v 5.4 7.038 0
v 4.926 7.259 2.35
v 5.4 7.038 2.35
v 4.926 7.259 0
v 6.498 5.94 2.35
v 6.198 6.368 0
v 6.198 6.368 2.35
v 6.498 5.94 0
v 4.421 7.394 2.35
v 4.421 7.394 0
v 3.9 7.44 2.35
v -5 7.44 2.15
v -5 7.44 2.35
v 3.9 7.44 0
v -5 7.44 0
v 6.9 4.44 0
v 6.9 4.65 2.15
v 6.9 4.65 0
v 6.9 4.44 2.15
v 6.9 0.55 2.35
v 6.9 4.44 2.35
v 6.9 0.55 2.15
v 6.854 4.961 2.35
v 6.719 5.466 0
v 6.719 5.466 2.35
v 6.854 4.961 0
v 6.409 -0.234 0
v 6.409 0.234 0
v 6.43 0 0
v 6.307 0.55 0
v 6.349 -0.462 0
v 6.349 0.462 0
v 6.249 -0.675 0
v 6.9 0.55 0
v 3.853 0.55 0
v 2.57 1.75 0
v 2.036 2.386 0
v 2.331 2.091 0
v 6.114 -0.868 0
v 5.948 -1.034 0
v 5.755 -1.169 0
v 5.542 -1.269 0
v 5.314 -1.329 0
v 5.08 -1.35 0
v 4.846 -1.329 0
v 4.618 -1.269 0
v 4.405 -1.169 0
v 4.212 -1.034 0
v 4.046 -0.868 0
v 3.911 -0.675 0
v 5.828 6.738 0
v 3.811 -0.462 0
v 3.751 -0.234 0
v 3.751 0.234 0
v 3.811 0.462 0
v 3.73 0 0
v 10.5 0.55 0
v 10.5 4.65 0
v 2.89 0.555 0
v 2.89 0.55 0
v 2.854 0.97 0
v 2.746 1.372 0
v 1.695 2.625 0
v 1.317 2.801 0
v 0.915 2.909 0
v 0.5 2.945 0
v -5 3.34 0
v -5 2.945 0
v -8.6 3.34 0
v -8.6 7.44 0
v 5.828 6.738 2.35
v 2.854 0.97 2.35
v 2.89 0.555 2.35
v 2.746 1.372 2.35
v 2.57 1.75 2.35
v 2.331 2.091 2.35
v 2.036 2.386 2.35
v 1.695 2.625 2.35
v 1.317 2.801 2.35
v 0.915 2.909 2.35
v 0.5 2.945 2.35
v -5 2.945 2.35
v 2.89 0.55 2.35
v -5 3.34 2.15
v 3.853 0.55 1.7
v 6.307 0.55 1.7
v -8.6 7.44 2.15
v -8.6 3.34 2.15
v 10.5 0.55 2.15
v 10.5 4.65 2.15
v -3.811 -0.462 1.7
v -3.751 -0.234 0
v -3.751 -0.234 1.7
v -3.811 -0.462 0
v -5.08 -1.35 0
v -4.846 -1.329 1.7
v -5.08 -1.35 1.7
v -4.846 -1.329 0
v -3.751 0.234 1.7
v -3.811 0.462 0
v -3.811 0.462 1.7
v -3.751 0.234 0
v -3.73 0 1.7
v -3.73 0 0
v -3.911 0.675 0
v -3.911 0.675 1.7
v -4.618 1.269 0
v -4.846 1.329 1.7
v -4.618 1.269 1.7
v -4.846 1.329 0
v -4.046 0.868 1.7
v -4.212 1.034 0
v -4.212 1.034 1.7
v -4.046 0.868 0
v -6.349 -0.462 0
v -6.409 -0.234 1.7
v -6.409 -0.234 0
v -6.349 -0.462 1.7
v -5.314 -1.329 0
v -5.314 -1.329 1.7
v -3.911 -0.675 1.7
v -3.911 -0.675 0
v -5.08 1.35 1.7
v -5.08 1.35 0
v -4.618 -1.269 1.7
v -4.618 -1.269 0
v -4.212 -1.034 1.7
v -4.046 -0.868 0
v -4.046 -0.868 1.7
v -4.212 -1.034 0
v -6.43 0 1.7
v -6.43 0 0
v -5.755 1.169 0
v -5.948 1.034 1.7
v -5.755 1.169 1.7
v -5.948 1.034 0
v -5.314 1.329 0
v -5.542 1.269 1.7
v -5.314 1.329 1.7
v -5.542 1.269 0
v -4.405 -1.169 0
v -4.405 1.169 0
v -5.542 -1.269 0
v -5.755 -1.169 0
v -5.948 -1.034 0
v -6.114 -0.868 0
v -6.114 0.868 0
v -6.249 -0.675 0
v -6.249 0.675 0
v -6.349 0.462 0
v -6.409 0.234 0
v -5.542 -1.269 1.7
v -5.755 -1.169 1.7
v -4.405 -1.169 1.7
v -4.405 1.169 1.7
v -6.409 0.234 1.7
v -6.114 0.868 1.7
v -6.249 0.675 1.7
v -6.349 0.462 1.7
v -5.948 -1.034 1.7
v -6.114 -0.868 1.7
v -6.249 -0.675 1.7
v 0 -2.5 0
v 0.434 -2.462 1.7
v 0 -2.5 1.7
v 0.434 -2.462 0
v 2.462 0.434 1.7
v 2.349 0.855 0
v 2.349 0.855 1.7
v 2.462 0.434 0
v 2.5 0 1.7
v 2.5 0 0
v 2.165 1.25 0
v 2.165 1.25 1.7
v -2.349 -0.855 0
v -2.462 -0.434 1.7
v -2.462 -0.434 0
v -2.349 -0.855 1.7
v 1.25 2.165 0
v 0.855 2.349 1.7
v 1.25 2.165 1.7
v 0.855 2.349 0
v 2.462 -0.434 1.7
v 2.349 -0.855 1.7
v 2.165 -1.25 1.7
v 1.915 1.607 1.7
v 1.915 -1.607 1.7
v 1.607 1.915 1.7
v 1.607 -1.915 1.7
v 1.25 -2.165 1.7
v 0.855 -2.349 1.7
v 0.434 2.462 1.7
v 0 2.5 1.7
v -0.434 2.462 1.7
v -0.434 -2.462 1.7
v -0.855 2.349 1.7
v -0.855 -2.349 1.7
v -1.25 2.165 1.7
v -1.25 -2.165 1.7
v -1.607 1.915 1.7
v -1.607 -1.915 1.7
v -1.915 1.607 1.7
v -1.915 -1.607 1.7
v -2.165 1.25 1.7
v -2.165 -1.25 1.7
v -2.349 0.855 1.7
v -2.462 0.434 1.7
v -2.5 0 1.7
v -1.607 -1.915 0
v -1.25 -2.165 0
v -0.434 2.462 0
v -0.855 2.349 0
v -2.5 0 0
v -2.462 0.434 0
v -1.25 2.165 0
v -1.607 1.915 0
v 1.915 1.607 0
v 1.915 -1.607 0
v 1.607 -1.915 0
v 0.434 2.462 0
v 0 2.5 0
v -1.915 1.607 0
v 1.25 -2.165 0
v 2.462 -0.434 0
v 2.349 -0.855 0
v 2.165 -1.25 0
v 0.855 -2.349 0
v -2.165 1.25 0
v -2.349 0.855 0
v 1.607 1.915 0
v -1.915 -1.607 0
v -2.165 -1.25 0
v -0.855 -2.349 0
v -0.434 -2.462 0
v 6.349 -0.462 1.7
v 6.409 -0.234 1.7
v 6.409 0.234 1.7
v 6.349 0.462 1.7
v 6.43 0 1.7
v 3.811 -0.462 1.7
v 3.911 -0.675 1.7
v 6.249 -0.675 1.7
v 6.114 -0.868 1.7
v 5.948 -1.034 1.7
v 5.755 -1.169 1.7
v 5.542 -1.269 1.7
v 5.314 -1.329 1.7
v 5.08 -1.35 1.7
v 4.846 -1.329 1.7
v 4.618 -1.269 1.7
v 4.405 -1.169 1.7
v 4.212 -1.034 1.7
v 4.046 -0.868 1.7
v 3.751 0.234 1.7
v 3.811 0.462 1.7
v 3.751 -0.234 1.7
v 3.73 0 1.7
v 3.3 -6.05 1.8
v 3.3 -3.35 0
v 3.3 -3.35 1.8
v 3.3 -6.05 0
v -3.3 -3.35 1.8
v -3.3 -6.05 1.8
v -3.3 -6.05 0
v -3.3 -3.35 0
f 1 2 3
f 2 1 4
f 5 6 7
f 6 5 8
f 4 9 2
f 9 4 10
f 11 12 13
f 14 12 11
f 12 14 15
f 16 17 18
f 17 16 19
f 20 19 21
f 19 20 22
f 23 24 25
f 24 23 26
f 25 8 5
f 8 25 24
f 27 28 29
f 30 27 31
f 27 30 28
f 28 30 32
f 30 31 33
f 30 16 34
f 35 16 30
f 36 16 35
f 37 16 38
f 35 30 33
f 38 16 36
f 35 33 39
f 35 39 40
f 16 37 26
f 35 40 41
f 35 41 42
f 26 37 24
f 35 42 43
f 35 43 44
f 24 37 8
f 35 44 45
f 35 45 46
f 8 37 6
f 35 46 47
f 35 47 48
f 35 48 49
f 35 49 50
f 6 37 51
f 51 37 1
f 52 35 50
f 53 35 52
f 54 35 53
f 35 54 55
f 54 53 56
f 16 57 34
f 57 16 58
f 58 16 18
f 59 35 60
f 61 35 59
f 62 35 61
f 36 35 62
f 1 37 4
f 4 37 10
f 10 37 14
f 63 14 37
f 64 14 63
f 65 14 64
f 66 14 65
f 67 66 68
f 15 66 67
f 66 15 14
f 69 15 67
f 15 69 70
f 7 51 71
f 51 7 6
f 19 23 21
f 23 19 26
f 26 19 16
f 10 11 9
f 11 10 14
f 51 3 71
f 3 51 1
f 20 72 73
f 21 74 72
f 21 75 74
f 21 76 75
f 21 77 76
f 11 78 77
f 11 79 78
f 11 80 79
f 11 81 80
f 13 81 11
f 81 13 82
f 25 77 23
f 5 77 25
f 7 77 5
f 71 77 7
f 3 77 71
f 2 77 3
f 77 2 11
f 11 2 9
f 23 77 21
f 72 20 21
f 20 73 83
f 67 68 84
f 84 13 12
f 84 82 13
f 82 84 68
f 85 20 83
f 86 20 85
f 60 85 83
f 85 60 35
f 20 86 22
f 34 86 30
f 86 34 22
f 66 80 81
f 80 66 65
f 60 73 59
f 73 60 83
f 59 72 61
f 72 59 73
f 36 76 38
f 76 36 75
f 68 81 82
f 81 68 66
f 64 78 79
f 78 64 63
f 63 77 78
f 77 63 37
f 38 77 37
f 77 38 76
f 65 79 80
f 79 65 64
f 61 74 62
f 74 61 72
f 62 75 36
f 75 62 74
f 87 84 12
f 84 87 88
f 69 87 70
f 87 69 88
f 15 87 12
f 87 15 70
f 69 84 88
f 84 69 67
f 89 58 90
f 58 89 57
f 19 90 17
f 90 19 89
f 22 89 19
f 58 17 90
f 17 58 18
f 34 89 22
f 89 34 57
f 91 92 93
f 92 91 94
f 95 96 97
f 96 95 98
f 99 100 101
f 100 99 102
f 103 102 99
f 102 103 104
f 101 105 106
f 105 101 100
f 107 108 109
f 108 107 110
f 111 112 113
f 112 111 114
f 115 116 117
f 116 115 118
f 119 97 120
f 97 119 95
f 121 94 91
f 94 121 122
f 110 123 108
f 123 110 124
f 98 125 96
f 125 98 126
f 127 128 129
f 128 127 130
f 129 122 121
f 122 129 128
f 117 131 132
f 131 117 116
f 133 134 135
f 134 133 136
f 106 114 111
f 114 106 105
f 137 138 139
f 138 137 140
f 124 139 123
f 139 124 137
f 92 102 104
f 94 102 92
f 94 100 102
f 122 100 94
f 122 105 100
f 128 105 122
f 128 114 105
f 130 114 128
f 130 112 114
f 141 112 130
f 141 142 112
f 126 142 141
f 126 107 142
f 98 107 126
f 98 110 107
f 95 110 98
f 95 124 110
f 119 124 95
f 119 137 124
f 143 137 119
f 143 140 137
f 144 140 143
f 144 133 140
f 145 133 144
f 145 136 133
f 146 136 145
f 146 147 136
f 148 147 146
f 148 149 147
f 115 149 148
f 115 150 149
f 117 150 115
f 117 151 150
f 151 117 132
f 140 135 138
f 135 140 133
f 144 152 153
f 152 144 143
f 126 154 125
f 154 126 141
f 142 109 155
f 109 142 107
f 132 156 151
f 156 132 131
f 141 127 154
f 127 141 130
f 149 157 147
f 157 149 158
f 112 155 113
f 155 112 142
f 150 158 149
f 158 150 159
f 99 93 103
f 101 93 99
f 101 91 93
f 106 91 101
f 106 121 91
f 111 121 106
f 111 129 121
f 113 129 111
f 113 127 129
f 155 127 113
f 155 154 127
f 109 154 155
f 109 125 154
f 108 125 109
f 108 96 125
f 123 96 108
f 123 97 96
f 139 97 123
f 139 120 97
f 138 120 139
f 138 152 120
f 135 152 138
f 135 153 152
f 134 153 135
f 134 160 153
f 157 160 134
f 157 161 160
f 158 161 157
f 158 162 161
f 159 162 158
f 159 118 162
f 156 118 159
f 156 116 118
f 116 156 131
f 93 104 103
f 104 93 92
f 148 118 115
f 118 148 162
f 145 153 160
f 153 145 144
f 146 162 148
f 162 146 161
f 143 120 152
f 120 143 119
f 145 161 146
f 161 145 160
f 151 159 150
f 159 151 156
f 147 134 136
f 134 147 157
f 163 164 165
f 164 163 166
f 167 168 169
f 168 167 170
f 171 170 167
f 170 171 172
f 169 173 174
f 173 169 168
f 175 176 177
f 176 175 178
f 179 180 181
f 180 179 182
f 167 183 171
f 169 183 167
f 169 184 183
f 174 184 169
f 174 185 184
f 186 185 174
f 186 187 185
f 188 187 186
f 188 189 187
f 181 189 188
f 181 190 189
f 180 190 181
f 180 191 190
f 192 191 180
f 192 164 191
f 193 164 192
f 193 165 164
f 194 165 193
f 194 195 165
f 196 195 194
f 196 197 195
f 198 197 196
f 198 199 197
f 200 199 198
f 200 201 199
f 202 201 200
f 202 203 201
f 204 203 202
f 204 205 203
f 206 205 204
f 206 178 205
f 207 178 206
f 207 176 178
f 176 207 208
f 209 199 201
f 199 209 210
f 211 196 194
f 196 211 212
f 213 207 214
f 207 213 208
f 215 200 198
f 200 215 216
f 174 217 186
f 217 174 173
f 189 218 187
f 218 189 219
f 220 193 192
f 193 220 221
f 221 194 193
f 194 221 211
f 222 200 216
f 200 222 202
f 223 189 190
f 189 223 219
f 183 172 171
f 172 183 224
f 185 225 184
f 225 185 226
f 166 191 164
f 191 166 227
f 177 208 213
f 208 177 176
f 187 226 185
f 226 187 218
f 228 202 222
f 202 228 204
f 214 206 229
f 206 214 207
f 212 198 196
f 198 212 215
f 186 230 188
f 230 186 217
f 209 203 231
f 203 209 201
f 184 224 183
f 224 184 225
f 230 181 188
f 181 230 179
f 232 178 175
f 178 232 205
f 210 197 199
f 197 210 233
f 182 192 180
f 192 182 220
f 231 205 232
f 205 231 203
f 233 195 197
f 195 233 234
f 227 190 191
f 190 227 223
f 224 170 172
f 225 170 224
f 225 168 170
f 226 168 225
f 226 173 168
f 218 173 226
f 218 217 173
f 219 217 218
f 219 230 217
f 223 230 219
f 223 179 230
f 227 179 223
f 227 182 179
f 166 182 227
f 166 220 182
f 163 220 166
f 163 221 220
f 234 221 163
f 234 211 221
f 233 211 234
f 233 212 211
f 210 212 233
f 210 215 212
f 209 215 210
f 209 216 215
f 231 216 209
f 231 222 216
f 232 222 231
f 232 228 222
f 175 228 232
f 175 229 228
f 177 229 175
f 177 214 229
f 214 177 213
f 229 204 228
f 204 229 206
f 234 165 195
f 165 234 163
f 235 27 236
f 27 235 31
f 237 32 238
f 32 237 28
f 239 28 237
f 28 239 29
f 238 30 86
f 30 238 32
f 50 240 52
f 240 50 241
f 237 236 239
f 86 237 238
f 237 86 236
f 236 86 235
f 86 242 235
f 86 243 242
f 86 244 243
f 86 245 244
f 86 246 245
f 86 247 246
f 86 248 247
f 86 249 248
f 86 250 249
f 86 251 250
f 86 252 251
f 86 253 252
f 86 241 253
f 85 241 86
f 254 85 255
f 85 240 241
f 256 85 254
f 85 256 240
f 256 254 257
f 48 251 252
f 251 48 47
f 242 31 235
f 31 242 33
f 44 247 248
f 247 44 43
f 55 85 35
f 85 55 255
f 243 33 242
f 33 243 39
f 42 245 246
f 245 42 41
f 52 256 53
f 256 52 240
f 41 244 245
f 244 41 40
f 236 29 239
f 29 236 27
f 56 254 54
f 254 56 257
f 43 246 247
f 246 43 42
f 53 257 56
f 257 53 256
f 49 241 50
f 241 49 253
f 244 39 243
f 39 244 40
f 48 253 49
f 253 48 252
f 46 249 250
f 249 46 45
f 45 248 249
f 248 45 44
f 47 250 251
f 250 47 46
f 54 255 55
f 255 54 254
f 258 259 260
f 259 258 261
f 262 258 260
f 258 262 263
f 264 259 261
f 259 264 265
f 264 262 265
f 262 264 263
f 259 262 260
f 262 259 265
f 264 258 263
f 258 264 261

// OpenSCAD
$fs = 0.1;
$fa = 10;

module basic_key_hole() {
    union() {
        translate([-5, 0.55]) difference() {
            intersection() {
                minkowski() {
                    cube([11.9 - 3, 6.89 - 3, 0.01]);
                    cylinder(r = 3, h = 2.35);
                }

                cube([11.9, 6.89, 2.35]);
            }

            minkowski() {
                cube([11, 0.01, 0.01], center = true);
                cylinder(r = 2.39, h = 5);
            }
        }

        translate([-8.6, 3.34]) cube([3.6, 4.1, 2.15]);
        translate([ 6.9, 0.55]) cube([3.6, 4.1, 2.15]);

        translate([-5.08, 0]) cylinder(r = 1.35, h = 1.7);
        translate([ 0.00, 0]) cylinder(r = 2.50, h = 1.7);
        translate([ 5.08, 0]) cylinder(r = 1.35, h = 1.7);

        translate([0, -4.7, 0.9]) cube([6.6, 2.7, 1.8], center = true);
    }
}

basic_key_hole();
